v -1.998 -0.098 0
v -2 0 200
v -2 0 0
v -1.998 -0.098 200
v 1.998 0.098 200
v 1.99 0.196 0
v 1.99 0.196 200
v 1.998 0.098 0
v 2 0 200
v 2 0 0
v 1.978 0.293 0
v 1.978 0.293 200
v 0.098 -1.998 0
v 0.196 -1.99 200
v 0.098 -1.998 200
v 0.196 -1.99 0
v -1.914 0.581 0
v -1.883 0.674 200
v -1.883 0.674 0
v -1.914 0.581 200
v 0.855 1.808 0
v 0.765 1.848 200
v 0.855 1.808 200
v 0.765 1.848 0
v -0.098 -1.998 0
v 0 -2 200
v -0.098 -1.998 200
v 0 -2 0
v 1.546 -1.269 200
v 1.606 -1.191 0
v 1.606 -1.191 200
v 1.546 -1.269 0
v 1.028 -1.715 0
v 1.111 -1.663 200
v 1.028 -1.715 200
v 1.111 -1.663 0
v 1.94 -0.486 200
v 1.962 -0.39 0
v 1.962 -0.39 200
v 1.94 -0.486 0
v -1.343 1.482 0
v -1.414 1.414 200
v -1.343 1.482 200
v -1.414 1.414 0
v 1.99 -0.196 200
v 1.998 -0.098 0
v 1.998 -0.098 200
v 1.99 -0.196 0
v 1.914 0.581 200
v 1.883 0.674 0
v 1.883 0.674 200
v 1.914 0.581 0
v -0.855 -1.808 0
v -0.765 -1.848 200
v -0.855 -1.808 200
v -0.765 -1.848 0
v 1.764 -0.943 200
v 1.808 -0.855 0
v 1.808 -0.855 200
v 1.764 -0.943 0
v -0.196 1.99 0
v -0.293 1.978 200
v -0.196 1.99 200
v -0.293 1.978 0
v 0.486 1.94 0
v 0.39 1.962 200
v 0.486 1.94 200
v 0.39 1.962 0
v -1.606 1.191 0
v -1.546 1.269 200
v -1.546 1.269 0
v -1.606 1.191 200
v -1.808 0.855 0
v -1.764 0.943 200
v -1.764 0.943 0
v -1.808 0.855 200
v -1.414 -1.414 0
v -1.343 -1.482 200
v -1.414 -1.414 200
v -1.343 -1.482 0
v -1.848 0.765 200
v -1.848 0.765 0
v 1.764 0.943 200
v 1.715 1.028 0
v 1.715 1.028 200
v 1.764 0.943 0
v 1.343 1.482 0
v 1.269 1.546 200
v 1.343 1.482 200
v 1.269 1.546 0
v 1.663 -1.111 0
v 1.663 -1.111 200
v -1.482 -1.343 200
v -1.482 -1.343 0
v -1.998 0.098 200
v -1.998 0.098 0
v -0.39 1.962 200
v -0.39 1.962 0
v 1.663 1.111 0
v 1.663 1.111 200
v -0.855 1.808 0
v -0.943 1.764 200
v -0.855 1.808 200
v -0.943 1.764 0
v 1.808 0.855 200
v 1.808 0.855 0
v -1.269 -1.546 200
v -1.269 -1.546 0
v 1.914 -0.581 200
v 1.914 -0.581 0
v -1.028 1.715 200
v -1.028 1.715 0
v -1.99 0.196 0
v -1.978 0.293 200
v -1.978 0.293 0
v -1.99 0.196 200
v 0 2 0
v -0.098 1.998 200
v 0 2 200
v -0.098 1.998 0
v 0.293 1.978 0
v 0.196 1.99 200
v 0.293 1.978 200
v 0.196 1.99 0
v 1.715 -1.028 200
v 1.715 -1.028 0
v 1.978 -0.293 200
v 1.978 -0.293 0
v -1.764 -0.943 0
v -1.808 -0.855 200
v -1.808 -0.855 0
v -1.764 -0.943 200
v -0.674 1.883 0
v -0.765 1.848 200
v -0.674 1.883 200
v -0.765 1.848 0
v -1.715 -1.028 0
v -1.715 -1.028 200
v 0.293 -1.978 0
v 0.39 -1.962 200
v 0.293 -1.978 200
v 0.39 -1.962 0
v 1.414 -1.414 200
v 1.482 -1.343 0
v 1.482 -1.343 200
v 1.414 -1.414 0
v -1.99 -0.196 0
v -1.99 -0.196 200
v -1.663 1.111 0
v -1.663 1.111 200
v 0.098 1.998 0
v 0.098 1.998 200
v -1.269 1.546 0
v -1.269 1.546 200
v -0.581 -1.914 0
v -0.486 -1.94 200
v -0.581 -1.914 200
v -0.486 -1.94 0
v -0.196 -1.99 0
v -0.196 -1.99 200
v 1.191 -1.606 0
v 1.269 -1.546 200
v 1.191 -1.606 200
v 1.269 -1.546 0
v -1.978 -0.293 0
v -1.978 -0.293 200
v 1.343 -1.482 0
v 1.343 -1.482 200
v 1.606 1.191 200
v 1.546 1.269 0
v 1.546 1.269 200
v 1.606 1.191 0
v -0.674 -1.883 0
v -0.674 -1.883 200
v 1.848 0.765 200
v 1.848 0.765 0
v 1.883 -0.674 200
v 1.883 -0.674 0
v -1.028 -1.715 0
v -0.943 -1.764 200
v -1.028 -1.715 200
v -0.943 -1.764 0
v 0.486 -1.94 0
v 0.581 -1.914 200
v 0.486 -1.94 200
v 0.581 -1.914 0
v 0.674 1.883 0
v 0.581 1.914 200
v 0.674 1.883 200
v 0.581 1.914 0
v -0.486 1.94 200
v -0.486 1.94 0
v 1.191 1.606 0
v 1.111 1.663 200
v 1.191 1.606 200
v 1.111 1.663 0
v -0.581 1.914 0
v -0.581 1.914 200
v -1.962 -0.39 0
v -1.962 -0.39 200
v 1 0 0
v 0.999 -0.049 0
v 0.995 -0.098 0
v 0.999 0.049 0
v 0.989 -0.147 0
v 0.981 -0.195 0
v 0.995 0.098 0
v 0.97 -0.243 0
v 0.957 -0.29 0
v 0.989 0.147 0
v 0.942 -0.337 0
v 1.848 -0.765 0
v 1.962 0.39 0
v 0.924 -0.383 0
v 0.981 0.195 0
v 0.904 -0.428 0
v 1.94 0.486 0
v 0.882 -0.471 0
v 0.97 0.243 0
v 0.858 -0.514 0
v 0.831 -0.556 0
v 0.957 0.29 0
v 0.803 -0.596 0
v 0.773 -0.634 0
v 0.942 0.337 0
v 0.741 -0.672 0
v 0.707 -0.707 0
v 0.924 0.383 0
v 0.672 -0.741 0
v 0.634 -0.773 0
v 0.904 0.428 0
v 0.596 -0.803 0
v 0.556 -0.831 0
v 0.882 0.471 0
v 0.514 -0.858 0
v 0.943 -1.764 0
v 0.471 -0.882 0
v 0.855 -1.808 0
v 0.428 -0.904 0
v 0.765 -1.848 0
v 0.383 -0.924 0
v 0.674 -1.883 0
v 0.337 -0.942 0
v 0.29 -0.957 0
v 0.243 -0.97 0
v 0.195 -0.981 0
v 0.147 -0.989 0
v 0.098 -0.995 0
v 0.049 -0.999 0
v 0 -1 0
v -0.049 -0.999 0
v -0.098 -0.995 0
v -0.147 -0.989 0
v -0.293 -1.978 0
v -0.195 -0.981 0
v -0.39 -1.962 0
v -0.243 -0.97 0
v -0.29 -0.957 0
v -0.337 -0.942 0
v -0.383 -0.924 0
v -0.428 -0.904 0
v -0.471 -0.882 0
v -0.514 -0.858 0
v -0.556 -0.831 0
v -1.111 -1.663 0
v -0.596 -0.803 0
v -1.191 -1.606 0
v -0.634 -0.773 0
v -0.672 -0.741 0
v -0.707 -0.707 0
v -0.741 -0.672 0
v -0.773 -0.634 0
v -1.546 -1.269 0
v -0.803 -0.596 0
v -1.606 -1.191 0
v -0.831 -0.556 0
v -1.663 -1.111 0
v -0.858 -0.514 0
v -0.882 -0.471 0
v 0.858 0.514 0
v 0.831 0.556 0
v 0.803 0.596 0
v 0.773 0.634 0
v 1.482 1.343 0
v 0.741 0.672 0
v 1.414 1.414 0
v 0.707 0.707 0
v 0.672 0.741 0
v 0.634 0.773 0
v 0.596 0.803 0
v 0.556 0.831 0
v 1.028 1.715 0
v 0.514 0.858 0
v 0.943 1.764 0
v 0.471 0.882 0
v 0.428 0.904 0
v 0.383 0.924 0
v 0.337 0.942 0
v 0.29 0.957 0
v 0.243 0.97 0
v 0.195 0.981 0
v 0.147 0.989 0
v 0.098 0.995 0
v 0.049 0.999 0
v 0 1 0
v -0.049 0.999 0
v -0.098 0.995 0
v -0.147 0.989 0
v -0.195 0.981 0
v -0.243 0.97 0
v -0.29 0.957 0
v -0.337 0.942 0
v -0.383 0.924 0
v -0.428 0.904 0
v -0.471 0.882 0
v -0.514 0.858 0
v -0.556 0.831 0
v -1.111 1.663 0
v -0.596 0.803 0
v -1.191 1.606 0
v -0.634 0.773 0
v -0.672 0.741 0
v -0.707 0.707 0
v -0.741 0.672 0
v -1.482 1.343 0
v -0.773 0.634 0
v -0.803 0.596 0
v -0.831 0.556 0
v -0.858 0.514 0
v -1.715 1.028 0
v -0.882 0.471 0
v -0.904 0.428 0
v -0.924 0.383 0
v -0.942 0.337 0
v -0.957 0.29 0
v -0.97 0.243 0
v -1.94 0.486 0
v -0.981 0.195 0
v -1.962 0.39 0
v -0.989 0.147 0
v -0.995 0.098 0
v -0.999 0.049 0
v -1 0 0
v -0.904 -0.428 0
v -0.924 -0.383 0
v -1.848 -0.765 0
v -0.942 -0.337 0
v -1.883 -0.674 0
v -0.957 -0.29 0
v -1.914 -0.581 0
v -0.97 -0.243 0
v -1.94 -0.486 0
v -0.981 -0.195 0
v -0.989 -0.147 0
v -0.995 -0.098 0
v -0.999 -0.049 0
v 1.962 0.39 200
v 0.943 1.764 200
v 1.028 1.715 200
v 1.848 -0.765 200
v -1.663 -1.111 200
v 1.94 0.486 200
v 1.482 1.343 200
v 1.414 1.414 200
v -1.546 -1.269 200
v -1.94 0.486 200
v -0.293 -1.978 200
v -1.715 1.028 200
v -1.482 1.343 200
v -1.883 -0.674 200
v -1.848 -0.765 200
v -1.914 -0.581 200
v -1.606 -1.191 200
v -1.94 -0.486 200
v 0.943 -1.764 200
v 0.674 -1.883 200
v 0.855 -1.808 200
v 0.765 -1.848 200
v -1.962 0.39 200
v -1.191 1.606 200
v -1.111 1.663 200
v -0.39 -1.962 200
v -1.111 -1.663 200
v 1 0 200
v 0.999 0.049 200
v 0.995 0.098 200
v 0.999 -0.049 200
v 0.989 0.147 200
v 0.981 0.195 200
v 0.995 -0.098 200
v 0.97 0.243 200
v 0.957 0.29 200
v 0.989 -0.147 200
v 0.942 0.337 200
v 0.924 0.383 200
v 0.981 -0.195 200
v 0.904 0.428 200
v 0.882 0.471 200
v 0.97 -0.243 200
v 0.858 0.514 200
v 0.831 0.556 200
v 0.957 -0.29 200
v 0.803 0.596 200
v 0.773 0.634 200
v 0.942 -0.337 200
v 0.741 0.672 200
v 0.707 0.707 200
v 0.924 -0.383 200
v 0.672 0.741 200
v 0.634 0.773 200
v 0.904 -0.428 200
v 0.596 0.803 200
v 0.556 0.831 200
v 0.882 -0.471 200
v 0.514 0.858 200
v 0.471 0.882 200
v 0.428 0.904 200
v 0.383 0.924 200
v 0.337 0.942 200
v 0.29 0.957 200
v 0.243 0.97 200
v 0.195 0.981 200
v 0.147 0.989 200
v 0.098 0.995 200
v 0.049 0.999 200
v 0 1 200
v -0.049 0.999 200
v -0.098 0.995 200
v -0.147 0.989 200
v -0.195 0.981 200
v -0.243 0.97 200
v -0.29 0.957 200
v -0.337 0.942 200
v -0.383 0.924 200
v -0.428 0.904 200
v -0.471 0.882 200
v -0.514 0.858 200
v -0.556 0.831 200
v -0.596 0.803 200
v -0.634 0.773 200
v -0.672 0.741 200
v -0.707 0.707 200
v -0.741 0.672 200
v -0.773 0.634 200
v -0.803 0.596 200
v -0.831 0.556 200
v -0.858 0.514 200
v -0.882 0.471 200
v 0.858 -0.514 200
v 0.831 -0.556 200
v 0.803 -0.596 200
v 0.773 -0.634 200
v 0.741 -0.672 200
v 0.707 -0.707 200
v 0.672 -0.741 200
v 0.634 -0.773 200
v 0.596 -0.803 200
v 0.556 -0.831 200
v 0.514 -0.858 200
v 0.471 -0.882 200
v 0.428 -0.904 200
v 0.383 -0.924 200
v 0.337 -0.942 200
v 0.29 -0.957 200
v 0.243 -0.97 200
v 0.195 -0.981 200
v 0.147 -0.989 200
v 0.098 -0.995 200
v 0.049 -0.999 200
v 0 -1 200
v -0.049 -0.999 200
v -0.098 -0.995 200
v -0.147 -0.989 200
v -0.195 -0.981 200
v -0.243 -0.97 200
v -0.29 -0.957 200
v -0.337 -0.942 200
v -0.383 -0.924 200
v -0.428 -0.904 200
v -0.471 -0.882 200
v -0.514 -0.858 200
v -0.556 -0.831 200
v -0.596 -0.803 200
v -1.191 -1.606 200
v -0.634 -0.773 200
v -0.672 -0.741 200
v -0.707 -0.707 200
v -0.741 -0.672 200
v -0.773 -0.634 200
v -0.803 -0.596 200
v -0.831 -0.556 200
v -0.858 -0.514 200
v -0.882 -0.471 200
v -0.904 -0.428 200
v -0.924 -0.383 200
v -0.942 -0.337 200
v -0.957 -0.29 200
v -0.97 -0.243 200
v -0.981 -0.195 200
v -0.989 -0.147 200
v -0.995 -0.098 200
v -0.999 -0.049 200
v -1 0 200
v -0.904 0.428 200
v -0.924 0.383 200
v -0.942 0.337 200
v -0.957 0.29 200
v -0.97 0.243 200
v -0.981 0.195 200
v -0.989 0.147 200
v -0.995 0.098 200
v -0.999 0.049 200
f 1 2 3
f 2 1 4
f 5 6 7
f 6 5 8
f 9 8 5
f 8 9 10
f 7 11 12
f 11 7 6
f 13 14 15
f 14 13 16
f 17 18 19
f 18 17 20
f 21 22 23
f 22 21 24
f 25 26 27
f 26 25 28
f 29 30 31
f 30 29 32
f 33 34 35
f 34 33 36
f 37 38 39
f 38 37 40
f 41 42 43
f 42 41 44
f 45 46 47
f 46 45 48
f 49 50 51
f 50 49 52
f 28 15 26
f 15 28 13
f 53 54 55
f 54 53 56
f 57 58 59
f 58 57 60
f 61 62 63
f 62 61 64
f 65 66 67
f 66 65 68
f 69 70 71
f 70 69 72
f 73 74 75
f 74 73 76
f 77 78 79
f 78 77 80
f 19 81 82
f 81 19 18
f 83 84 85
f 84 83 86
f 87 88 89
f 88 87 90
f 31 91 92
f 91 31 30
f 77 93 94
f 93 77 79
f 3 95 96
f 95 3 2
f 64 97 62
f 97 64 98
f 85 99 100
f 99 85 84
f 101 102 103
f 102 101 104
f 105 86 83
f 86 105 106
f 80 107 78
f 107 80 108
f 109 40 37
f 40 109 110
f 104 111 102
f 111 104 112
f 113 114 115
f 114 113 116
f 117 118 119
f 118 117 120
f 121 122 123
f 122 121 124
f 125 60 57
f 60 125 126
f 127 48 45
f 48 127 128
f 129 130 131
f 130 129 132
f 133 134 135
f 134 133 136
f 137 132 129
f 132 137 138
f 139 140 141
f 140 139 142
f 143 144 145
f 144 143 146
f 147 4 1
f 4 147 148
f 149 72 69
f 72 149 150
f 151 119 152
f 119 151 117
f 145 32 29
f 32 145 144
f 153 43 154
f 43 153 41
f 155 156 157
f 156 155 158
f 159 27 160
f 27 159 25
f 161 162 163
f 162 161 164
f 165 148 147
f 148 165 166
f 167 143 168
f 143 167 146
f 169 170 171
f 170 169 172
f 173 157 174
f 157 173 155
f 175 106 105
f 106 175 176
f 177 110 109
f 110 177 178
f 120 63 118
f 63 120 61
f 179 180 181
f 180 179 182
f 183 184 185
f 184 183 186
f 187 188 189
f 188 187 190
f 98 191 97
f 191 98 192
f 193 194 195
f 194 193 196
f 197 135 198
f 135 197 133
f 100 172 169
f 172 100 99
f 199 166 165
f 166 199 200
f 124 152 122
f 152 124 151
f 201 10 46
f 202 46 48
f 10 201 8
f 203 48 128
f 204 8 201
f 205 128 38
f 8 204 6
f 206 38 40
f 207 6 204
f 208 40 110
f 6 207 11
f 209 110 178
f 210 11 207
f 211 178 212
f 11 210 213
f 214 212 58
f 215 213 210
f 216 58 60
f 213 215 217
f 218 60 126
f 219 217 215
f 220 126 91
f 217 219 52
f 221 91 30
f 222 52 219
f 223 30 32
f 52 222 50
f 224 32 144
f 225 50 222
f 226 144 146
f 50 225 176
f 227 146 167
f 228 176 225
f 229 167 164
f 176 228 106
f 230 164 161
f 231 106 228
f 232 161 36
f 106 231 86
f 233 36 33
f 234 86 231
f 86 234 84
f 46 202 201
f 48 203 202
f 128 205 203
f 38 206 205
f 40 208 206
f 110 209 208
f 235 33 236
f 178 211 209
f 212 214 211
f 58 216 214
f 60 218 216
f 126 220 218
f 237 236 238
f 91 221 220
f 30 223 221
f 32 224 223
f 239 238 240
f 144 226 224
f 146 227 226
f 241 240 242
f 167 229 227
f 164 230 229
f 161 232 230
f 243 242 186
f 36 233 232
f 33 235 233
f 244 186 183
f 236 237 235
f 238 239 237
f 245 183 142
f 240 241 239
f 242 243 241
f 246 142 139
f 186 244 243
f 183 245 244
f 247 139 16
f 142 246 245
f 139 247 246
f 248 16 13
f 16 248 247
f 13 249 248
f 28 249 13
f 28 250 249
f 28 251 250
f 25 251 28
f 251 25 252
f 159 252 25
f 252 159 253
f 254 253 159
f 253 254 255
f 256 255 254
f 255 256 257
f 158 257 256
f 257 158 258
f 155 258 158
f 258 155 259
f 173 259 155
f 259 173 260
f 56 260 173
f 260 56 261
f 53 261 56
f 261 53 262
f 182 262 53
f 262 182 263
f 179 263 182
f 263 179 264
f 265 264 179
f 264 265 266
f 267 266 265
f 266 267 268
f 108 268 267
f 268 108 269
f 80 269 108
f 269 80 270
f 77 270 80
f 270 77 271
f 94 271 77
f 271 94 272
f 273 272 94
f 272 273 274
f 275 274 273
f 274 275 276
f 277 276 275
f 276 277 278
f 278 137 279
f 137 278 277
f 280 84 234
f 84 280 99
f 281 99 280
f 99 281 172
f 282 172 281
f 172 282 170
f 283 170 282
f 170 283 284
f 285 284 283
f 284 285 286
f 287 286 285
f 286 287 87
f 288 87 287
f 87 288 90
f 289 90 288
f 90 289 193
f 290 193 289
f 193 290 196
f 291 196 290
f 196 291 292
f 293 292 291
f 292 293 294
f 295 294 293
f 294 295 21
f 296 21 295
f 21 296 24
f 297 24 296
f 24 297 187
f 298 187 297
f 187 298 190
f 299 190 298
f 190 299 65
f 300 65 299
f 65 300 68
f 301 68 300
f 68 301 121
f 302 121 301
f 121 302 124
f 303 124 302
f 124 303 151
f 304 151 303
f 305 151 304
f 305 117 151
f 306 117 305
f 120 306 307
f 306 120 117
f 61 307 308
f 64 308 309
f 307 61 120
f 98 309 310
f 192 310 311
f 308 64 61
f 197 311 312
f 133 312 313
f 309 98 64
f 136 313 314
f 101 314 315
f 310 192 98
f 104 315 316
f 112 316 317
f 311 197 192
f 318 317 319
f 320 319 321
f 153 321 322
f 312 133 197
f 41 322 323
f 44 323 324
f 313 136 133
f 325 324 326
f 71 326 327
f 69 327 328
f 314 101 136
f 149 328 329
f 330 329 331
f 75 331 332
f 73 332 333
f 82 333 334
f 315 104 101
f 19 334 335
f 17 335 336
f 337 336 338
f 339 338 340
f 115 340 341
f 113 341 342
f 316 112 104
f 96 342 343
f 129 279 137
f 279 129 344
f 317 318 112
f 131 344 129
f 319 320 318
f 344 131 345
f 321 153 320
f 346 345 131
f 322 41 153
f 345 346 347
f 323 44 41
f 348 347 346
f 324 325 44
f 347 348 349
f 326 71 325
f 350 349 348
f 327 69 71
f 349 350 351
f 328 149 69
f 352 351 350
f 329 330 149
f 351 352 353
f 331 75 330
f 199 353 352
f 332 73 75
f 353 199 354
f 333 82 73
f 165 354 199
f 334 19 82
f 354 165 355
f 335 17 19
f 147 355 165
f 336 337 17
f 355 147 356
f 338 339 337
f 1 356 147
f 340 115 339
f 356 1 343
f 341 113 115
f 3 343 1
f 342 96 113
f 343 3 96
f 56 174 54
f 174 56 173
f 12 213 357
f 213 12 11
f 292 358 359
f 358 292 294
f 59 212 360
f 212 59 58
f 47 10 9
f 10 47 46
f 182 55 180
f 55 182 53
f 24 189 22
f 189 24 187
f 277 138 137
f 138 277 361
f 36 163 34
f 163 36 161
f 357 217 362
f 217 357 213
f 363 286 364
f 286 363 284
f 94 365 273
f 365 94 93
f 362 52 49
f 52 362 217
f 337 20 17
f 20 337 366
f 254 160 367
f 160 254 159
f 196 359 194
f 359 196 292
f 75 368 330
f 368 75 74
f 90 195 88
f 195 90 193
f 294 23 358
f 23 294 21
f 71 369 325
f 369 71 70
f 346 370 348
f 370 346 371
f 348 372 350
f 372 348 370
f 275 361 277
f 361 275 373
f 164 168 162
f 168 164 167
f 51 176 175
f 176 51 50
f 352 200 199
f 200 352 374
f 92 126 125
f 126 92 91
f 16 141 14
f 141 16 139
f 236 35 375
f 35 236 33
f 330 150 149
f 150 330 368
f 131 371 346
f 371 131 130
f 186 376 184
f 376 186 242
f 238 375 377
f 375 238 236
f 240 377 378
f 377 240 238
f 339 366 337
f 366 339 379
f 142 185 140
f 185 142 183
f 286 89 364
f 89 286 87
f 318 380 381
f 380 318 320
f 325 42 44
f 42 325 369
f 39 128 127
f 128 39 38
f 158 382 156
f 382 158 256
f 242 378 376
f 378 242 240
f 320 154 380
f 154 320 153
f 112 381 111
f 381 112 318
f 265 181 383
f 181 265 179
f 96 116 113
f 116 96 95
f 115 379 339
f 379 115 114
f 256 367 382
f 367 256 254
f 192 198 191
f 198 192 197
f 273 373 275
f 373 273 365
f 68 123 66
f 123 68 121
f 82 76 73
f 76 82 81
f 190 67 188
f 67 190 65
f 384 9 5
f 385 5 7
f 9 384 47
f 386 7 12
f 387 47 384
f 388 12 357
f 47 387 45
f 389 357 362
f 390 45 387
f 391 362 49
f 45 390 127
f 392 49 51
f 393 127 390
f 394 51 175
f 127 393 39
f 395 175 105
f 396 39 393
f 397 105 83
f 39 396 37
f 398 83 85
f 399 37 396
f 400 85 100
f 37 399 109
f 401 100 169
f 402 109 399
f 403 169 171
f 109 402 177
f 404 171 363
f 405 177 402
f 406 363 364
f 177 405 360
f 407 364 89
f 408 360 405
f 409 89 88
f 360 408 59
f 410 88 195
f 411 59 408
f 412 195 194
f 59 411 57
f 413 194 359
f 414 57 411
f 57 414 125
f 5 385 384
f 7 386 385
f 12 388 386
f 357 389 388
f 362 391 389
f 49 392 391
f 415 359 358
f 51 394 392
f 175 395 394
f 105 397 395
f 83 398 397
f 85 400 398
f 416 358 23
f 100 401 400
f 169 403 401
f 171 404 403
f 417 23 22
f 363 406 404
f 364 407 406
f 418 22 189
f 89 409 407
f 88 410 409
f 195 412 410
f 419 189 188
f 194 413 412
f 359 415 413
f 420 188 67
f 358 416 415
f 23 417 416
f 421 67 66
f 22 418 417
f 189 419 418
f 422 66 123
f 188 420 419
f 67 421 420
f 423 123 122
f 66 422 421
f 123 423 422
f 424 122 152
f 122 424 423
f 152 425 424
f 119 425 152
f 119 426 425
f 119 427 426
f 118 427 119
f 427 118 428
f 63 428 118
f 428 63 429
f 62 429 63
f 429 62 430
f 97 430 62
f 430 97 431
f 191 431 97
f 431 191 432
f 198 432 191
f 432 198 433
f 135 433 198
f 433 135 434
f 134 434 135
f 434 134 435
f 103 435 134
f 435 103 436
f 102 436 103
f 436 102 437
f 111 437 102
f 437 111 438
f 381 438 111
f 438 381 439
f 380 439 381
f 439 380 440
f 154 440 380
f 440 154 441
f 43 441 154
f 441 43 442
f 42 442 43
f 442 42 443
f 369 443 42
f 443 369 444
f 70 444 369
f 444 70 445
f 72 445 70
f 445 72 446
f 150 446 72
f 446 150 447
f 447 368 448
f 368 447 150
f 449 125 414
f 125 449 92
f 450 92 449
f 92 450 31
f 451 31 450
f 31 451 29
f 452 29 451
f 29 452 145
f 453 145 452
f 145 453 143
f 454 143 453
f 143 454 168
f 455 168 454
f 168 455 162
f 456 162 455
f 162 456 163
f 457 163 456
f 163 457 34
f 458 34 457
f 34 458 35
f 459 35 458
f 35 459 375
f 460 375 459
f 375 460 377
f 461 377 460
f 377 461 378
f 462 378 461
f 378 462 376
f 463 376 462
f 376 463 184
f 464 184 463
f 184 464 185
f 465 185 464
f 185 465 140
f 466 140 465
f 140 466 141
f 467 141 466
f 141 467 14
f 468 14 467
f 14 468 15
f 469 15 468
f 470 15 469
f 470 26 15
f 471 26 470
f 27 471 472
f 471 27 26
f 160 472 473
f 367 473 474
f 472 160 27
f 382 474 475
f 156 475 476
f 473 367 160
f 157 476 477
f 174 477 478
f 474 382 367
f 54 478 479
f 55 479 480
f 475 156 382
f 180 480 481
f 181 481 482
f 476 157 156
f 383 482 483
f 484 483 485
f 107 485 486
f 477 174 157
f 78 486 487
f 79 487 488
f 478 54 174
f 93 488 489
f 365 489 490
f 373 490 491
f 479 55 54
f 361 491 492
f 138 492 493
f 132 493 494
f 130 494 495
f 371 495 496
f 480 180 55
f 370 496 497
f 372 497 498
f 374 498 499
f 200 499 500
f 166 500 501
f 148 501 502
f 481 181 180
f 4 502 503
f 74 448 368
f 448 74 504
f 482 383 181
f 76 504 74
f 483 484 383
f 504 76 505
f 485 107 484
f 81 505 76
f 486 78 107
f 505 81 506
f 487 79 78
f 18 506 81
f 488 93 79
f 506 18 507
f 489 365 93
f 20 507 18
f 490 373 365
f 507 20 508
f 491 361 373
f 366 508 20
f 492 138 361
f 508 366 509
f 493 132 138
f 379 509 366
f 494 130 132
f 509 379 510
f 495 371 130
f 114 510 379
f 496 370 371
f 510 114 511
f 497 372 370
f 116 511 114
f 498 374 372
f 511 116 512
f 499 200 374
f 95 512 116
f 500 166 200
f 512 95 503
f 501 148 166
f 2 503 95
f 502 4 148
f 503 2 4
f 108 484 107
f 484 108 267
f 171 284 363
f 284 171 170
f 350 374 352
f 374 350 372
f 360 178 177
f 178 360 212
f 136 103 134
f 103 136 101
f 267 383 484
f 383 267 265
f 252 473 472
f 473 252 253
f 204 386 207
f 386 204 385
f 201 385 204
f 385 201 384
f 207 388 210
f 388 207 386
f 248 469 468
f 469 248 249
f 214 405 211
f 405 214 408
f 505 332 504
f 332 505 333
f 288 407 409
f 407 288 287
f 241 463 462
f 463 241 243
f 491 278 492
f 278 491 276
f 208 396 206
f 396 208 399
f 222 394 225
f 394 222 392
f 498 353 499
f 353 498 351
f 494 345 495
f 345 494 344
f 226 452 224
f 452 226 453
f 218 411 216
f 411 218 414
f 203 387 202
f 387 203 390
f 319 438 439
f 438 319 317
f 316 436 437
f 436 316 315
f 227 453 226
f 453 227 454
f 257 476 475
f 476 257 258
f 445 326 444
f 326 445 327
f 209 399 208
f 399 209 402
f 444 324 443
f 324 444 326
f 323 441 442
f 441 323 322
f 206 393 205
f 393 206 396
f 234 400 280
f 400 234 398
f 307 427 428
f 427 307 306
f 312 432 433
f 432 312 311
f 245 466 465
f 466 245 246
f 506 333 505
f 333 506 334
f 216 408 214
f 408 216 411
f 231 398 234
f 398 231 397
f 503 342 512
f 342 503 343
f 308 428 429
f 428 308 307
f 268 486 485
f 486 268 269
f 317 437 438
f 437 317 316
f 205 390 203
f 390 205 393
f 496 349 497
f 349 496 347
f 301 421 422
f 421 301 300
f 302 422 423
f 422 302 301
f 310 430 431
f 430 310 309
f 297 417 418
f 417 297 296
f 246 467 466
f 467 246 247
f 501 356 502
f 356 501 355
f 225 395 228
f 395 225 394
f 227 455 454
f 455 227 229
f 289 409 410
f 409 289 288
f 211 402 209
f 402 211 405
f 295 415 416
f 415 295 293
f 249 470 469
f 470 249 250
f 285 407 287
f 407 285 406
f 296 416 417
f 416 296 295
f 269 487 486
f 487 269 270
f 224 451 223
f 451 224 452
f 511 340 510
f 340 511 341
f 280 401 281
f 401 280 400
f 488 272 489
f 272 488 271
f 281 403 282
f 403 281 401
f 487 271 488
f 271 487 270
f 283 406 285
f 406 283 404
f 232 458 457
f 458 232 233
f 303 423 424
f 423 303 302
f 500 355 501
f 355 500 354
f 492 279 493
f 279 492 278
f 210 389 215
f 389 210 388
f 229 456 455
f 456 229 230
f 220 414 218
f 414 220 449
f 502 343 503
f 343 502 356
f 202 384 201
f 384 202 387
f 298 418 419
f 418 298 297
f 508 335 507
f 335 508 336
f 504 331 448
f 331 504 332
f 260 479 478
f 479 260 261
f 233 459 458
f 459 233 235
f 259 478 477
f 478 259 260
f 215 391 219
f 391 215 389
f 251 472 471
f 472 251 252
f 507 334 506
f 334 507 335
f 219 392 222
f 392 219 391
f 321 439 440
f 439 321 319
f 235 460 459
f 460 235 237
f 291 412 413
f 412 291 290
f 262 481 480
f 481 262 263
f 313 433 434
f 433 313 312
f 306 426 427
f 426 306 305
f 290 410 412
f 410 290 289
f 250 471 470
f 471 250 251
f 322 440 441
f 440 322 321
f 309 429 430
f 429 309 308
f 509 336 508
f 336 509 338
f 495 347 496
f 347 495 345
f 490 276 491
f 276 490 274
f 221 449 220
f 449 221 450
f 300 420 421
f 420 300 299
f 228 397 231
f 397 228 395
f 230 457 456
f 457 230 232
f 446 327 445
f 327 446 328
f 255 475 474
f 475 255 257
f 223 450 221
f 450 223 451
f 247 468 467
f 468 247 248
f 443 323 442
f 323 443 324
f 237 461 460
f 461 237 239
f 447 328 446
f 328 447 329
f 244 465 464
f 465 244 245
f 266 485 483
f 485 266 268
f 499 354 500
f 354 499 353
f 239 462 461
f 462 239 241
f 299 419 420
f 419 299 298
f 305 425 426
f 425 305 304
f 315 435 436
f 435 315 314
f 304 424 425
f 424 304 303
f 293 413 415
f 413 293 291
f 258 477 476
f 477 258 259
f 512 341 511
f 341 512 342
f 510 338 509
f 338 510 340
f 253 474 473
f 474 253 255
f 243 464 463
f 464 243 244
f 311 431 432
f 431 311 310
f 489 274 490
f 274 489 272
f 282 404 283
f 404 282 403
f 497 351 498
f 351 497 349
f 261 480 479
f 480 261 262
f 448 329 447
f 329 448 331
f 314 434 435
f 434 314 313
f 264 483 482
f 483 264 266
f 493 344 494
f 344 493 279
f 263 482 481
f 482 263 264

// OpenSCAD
$fn = 128;

// PTFE tubing (simple hollow cylinder)
// Units: mm
outer_d = 4.0;     // typical PTFE tube OD
inner_d = 2.0;     // typical PTFE tube ID
length  = 200.0;   // tube length

module ptfe_tube(od, id, h) {
    difference() {
        cylinder(d=od, h=h, center=false);
        translate([0,0,-0.1]) cylinder(d=id, h=h+0.2, center=false);
    }
}

color([0.95, 0.95, 0.95, 1.0])
ptfe_tube(outer_d, inner_d, length);
